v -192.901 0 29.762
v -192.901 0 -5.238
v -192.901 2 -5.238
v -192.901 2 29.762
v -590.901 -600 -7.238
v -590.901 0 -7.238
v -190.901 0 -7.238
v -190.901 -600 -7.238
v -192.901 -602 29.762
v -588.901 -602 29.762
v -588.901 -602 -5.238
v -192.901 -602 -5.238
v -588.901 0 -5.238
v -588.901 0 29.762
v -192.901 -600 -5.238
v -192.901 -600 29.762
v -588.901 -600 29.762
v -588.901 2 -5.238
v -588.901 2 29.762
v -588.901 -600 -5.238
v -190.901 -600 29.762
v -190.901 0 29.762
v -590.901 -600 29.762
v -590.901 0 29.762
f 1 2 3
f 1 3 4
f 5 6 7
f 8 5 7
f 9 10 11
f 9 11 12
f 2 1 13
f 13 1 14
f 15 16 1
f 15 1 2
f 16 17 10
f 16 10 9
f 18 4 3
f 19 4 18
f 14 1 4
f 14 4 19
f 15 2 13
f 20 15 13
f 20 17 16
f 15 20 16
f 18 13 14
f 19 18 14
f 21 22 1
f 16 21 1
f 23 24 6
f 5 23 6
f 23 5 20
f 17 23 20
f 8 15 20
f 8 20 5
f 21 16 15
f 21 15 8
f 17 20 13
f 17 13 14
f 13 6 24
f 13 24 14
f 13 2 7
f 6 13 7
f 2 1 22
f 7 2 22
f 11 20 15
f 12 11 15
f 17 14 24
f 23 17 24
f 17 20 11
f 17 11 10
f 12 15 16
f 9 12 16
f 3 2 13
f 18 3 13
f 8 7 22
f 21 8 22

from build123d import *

# Parameters (mm, degrees)
F1_DEPTH = 600
F2_W     = 396
F2_H     = 35
F3_DEPTH = 2
F4_W     = 396
F4_H     = 35
F5_DEPTH = 2


with BuildPart() as f1:
    # F0 (on Front) → F1 (new body)
    with BuildSketch(Plane.XZ):
        Polygon((-192.9013718367, -5.2381562442), (-588.9013718367, -5.2381562442), (-588.9013718367, 29.7618437558), (-590.9013718367, 29.7618437558), (-590.9013718367, -5.2381562442), (-590.9013718367, -7.2381562442), (-190.9013718367, -7.2381562442), (-190.9013718367, -5.2381562442), (-190.9013718367, 29.7618437558), (-192.9013718367, 29.7618437558), align=None)
    extrude(amount=F1_DEPTH)


with BuildPart() as f3:
    # F2 (on face) → F3 (new body)
    with BuildSketch(Plane.XZ.offset(600)):
        with Locations((-390.9013718367, 12.2618437558)):
            Rectangle(F2_W, F2_H)
    extrude(amount=F3_DEPTH)


with BuildPart() as f5:
    # F4 (on face) → F5 (new body)
    with BuildSketch(Plane(origin=(0, 0, 0), x_dir=(-1, 0, 0), z_dir=(0, 1, 0))):
        with Locations((390.9013718367, 12.2618437558)):
            Rectangle(F4_W, F4_H)
    extrude(amount=F5_DEPTH)


solid = Compound([f1.part, f3.part, f5.part])
